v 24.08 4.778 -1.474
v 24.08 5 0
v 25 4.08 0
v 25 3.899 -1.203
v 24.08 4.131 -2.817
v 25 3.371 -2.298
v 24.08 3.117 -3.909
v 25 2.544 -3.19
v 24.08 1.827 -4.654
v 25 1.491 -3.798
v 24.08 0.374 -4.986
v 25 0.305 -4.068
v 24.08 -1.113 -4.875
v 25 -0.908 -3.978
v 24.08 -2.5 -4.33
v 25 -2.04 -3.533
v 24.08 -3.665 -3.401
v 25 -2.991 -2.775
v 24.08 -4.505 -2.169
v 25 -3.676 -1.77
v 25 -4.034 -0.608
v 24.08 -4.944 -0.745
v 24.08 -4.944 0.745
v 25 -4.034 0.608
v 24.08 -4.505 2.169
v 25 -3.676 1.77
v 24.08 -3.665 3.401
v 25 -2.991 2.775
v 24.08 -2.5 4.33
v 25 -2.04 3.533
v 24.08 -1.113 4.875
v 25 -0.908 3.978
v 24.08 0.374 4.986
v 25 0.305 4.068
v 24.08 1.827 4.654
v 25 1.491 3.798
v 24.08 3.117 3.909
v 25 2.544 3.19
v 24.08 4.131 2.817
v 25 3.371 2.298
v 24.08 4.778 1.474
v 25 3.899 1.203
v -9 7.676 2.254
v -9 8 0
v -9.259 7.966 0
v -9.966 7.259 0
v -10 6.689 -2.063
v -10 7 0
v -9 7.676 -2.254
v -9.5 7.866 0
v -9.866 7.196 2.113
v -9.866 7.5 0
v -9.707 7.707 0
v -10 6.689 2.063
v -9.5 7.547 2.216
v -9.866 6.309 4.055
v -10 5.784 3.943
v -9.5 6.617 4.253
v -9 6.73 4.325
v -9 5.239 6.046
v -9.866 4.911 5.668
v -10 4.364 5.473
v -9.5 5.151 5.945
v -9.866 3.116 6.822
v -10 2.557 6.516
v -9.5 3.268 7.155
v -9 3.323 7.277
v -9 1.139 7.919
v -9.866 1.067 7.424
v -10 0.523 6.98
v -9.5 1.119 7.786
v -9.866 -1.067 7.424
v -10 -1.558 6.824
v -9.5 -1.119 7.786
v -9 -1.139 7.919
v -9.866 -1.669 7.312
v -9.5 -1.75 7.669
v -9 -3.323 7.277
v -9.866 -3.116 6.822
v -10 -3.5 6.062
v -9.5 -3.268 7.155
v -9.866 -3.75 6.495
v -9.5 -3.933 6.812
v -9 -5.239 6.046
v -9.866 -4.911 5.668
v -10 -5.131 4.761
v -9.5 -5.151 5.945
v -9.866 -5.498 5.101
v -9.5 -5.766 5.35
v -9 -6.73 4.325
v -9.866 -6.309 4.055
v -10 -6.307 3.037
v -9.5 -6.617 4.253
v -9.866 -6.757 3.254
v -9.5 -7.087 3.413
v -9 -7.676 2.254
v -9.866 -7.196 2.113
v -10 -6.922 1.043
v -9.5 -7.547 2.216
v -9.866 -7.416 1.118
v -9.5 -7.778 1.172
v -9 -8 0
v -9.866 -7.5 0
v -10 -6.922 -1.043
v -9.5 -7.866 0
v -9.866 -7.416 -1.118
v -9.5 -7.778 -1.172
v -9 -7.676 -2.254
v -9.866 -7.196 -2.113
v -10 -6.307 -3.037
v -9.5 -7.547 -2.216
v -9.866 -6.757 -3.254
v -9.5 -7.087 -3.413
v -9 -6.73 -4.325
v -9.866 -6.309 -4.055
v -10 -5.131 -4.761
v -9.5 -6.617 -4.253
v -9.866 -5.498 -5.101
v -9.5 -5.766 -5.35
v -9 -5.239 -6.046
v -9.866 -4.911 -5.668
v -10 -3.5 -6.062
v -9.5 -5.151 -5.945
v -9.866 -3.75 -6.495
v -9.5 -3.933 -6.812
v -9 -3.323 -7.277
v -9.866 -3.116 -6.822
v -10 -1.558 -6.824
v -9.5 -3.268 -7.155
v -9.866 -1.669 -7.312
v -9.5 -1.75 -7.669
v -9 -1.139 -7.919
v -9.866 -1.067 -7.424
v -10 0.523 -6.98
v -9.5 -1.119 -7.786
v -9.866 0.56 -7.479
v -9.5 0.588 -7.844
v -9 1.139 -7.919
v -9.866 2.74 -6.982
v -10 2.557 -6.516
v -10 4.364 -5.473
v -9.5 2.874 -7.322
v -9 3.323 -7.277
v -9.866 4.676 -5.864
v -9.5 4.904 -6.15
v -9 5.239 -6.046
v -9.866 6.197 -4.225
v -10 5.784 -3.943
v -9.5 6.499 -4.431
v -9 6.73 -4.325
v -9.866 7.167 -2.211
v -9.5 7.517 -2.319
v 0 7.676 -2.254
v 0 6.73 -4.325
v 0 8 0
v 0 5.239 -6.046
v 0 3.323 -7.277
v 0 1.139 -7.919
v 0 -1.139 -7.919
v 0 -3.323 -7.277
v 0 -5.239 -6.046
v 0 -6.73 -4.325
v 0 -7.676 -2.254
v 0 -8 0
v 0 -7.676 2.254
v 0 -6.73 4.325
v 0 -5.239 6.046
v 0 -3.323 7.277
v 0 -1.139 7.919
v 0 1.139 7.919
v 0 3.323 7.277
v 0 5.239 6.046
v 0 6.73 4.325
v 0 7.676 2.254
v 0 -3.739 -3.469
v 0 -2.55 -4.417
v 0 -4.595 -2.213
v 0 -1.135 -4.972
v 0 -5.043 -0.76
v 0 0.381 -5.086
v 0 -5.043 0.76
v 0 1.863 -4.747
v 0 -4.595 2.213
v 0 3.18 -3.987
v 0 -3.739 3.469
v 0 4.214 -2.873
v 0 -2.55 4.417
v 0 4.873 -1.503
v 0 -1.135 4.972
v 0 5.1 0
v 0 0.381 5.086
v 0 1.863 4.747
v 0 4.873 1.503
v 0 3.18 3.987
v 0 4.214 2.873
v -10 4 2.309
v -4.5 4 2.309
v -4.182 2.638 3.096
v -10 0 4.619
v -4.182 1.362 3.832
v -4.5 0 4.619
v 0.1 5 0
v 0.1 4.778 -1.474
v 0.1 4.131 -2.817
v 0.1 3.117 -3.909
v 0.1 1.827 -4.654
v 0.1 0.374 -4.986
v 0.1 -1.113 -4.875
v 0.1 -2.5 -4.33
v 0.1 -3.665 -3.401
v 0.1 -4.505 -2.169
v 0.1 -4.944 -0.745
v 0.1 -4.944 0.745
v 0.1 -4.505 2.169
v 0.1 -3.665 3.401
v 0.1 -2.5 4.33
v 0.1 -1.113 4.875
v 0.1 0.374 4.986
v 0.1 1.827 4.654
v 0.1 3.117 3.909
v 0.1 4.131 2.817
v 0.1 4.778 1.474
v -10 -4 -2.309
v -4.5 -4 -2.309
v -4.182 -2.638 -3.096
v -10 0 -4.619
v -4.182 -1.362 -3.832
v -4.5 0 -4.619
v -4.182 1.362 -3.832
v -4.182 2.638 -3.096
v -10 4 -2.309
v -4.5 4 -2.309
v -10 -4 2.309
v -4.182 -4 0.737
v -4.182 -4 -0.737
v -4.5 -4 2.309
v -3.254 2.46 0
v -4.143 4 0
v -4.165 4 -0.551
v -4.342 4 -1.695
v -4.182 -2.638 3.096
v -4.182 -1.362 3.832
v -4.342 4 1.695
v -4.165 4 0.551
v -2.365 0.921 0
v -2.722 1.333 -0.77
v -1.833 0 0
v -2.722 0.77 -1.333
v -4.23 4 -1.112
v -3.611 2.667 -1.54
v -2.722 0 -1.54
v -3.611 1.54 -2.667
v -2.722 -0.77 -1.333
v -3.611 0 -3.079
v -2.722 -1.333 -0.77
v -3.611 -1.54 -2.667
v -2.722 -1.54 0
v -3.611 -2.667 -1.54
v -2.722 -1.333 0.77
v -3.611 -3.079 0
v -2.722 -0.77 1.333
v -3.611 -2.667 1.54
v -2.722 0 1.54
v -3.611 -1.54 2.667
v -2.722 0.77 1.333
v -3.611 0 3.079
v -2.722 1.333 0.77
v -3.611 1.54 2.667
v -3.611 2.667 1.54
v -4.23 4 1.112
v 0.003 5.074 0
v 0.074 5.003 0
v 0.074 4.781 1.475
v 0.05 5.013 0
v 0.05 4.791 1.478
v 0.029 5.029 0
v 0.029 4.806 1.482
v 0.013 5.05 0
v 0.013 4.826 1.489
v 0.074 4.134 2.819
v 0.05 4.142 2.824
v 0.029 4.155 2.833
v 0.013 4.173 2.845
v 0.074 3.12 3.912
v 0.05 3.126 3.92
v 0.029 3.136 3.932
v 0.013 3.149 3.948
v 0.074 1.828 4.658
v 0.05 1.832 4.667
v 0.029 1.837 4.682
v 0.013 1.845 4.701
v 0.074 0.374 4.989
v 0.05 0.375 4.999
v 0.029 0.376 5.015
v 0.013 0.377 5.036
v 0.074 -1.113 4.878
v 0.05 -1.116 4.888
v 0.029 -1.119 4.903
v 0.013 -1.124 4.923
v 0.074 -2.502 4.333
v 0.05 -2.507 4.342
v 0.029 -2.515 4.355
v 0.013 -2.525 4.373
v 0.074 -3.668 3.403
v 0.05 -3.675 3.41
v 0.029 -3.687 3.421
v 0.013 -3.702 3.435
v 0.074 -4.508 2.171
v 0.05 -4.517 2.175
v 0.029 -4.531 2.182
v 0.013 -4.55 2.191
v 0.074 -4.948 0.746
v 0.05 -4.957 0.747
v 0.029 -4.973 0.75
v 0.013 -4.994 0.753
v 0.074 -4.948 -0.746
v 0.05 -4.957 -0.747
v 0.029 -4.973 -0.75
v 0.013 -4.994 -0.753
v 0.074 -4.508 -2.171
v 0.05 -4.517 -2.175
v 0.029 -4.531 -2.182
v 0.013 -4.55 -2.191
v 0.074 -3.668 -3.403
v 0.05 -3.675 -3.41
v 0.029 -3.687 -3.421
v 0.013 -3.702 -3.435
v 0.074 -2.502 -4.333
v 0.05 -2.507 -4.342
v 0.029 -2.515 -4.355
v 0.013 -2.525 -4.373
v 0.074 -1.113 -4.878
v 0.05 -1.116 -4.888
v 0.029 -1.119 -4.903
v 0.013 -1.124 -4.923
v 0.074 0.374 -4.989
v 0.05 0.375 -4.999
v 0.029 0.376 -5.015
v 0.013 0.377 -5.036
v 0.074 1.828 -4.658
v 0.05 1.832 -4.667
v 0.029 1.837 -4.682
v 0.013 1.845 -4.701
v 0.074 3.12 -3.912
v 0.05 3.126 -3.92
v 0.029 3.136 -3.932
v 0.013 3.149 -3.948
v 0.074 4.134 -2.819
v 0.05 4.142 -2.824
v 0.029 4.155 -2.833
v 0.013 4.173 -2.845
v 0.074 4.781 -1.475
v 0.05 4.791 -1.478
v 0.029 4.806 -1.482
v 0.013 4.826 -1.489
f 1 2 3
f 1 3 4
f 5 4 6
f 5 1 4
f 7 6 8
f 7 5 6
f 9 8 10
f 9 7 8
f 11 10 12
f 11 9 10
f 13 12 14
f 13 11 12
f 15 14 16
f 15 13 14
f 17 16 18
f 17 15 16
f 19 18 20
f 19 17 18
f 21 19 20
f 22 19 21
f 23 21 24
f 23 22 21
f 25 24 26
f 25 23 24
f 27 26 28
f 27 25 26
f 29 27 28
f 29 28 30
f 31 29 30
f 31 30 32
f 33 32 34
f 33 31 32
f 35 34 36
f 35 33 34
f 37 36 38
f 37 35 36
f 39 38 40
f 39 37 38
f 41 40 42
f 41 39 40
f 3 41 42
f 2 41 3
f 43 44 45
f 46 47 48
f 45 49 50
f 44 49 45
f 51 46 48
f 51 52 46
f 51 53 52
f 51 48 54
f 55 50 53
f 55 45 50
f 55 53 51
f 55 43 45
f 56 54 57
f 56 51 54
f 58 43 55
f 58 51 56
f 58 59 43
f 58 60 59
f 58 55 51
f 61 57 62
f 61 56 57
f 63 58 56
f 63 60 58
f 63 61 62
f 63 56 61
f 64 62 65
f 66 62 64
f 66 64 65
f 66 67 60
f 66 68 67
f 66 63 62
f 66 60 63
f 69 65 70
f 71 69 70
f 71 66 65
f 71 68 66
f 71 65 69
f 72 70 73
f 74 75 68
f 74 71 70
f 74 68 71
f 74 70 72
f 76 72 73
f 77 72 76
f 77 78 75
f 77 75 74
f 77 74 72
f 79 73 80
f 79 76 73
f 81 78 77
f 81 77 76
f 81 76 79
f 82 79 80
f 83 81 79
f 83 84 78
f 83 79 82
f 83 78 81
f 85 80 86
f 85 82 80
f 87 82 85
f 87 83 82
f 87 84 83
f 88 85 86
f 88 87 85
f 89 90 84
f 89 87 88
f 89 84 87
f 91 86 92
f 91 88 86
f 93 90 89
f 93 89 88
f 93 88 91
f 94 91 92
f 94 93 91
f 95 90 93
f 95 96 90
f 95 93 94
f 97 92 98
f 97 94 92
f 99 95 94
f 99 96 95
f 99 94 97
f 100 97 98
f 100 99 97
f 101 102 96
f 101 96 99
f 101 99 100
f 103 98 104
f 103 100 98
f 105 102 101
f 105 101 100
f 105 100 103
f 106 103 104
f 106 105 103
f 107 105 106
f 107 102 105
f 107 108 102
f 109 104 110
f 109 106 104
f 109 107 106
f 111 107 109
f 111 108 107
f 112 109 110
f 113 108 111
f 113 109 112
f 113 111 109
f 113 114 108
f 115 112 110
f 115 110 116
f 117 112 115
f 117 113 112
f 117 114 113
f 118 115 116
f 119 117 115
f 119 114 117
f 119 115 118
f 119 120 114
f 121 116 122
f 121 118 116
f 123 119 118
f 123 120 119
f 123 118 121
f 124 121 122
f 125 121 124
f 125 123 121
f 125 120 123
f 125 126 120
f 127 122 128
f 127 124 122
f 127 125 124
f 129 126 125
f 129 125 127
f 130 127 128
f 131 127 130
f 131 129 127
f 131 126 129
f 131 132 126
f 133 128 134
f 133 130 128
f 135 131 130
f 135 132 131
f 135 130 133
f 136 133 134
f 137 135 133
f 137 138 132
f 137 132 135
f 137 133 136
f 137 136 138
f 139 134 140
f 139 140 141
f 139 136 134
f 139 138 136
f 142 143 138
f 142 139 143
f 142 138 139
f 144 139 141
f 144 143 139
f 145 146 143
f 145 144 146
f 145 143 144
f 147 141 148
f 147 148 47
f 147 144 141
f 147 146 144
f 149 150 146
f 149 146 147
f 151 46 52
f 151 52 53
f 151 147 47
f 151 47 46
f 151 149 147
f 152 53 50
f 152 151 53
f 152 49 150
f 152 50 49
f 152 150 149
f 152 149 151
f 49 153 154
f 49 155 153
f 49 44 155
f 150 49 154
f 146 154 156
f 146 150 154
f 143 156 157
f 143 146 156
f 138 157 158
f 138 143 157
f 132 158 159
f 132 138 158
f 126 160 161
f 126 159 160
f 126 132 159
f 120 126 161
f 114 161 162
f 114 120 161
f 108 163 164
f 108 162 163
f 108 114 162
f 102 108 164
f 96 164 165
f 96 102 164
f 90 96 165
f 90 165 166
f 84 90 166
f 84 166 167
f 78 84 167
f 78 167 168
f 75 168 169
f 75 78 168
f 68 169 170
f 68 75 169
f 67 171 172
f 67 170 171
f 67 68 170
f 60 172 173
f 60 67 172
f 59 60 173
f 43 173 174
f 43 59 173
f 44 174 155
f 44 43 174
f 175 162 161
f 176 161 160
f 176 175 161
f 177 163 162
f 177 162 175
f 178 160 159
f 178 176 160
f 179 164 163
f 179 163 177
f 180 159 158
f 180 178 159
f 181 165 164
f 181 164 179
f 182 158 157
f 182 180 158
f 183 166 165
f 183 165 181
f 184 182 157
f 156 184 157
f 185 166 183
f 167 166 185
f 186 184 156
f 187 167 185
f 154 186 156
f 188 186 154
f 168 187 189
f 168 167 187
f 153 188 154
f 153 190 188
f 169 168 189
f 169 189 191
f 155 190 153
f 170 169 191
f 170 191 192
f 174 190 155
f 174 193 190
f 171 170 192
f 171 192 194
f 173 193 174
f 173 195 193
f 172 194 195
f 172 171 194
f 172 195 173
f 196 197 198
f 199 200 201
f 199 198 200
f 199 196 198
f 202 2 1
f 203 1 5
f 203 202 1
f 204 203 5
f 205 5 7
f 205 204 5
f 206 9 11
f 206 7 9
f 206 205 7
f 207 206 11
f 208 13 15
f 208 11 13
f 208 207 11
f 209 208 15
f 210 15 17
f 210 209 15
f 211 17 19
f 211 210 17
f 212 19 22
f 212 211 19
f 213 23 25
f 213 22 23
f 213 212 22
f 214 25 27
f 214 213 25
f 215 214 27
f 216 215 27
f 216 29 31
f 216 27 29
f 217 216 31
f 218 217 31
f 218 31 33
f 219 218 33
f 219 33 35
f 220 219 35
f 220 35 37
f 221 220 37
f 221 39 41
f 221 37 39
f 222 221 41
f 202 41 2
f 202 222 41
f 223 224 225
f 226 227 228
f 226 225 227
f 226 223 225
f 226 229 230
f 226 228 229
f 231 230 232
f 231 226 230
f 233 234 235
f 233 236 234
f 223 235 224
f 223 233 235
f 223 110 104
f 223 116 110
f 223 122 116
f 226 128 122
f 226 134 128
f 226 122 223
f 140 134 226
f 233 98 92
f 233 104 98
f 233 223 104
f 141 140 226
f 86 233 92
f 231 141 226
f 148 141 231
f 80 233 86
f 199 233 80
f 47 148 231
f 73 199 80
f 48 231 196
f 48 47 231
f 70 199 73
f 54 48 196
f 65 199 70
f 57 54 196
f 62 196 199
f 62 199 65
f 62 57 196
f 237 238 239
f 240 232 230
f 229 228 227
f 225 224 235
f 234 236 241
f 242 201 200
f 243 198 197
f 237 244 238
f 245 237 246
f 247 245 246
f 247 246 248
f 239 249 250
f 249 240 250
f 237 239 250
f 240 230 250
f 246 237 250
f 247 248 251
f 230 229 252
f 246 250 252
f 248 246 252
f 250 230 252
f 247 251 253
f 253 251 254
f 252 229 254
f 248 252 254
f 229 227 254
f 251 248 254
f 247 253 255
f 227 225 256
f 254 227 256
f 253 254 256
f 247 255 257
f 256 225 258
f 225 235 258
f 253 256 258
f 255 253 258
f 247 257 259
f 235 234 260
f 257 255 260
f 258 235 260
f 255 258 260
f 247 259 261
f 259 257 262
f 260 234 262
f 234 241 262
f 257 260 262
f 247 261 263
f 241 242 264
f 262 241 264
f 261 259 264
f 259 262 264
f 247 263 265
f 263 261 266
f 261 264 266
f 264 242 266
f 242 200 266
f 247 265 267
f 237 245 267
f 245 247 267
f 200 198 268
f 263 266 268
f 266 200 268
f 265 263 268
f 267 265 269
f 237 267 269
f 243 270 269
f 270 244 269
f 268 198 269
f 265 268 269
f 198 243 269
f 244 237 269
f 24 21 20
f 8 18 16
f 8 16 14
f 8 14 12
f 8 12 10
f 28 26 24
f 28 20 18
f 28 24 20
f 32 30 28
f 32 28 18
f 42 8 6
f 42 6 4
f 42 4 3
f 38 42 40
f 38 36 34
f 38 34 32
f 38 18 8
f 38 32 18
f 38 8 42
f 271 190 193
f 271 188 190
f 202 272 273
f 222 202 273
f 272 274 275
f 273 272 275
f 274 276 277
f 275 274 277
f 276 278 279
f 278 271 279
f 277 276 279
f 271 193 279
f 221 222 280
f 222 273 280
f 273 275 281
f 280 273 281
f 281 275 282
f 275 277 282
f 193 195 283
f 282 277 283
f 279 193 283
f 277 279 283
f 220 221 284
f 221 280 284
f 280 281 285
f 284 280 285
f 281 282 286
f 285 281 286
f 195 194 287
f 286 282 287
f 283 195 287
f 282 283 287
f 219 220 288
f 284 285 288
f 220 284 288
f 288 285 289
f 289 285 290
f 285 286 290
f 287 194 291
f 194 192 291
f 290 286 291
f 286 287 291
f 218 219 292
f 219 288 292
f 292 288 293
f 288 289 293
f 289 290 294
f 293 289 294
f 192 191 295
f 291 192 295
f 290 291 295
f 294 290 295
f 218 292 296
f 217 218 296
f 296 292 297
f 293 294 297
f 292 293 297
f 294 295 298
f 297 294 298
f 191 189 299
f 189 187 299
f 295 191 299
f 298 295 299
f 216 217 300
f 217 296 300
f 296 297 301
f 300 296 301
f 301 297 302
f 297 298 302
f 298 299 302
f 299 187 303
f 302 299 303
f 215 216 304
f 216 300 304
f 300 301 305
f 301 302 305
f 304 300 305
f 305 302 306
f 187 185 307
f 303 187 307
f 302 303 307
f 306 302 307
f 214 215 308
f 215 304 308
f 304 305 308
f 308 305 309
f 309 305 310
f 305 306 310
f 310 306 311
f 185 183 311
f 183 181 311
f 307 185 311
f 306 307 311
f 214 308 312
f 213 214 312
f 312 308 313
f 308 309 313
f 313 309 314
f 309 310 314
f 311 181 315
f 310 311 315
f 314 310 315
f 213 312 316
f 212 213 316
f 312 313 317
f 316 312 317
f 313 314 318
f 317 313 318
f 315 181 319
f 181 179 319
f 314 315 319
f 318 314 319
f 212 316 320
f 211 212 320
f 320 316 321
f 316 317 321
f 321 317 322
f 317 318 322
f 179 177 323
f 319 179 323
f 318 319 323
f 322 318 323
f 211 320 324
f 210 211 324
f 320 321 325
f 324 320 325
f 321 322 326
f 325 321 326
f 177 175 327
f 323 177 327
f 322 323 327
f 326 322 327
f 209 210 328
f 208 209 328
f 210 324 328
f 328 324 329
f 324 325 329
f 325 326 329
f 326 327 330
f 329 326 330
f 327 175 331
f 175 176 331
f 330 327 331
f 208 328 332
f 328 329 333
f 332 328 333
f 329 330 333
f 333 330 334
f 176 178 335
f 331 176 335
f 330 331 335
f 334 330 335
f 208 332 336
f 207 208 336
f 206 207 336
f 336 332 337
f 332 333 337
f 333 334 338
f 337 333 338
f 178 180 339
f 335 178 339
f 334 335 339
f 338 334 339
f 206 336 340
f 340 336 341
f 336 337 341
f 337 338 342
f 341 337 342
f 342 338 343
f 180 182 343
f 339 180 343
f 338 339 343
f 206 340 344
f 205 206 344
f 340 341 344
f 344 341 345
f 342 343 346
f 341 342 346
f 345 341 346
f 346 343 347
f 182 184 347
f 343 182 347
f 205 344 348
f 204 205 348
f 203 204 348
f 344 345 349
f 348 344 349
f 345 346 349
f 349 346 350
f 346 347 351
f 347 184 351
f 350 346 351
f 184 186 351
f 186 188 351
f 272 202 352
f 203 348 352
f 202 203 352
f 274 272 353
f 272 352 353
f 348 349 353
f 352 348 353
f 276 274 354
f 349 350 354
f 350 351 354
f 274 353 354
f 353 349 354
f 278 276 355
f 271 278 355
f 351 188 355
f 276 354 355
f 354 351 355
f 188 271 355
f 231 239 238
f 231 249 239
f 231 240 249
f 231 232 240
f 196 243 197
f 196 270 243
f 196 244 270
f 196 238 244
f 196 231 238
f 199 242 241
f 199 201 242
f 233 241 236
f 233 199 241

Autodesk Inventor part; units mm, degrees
ref_plane "YZ Plane" through (0, 0, 0) normal (1, 0, 0) x (0, 1, 0)
ref_plane "XZ Plane" through (0, 0, 0) normal (0, 1, 0) x (-1, 0, 0)
sketch "Sketch1" plane through (0, 0, 0) normal (0, 0, 1) x (1, 0, 0)
  line L0 (-1.8333, 0) -> (25, 0)
  line L1 (25, 0) -> (25, 5)
  line L2 (25, 5) -> (4.5, 5)
  line L3 (4.5, 5) -> (3.5797, 5)
  line L4 (3.5797, 5) -> (0, 5)
  line L5 (0, 5) -> (0, 8)
  line L6 (0, 8) -> (-10, 8)
  line L7 (-10, 8) -> (-10, 4.6188)
  line L8 (-10, 4.6188) -> (-4.5, 4.6188)
  line L9 (-4.5, 4.6188) -> (-1.8333, 0)
  line L10 (-17, 0) -> (32, 0) projected
  line L11 (0, -1.6) -> (0, 9.6) projected
  line L12 (4.5, 5) -> (0, 5) construction
  dimension "d1" = 20.5
  dimension "d2" = 0.9203
  dimension "d3" = 10
  dimension "d4" = 5.5
  dimension "d5" = 60
  dimension "d6" = 10
  dimension "d7" = 10
  dimension "d8" = 9.2376
  dimension "d9" = 16
  dimension "d26" = 25
revolve "Body" add sketch "Sketch1" angle 360 about axis through (-1.8333, 0, 0) along (1, 0, 0)
sketch "Sketch2" plane through (-10, 0, 0) normal (-1, 0, 0) x (0, 0, 1)
  circle A0 centre (0, 0) radius 4.6188 projected
  line L0 (0, -11.2) -> (0, 11.2) projected
  line L1 (-11.2, 0) -> (11.2, 0) projected
  line L2 (4.6188, 0) -> (2.3094, -4)
  line L3 (2.3094, -4) -> (-2.3094, -4)
  line L4 (-2.3094, -4) -> (-4.6188, 0)
  line L5 (-4.6188, 0) -> (-2.3094, 4)
  line L6 (-2.3094, 4) -> (2.3094, 4)
  line L7 (2.3094, 4) -> (4.6188, 0)
extrude "Slot" add sketch "Sketch2" against normal up to next contours L7 A0 | A0 L2 | L6 L0 A0 | A0 L0 L3 | L0 L6 A0 | A0 L3 L0 | L4 A0 | A0 L5
fillet "Fillet1" radius 1 1 edges at (-10, -8, 0)
thread "Thread" size "M10x1.5" class "6g" standard "ISO Metric profile" length 20.5
chamfer "Chamfer1" distance 0.9202 distance2 0.9202 1 edges at (25, -5, 0) measured on face at (25, -0.8193, -0.3214)
ref_plane "Work Plane1" through (29, 0, 0) normal (0, -1, 0) x (1, 0, 0)
fillet "Fillet2" radius 0.1 1 edges at (0, -5, 0)
equation "\"d30\" = R"
equation "\"d17\" = RR"
equation "\"d13\" = GEL"
equation "\"d15\" = -0.5 * SPD + 0.5 * GD"
equation "\"d16\" = GUL"
equation "\"d1\" = GEL"
equation "\"d3\" = KOH"
equation "\"d4\" = INTI"
equation "\"d6\" = GD"
equation "\"d7\" = BDM"
equation "\"d8\" = 1.1547 * SW"
equation "\"d9\" = KOD"
equation "\"d26\" = NLG"
equation "\"GD\" = NND"
equation "\"NLG\" = 25"
equation "\"GEL\" = 20.5"
equation "\"KOD\" = 16"
equation "\"KOH\" = NND"
equation "\"INTI\" = 5.5"
equation "\"GAL\" = 0.61345 * PTC"
equation "\"GUL\" = 0.61345 * PTC"
equation "\"BDM\" = NND"
equation "\"SW\" = 8"
equation "\"RR\" = 1"
equation "\"SPD\" = NND - 1.2269 * PTC"
equation "\"R\" = 0.1"
equation "\"TOA\" = 30deg"
equation "\"GD1\" = THREADDIA - 1.2269 * PTC"
equation "\"FAWI\" = 45deg"
equation "\"PTC\" = 1.5"
equation "\"E0\" = 1.155 * SW"
equation "\"PHH\" = 0"
equation "\"NND\" = 10"
equation "\"THREADDIA\" = 10"
properties part number "CSN 02 1143 - M10 x 25" material "Steel, Mild"
